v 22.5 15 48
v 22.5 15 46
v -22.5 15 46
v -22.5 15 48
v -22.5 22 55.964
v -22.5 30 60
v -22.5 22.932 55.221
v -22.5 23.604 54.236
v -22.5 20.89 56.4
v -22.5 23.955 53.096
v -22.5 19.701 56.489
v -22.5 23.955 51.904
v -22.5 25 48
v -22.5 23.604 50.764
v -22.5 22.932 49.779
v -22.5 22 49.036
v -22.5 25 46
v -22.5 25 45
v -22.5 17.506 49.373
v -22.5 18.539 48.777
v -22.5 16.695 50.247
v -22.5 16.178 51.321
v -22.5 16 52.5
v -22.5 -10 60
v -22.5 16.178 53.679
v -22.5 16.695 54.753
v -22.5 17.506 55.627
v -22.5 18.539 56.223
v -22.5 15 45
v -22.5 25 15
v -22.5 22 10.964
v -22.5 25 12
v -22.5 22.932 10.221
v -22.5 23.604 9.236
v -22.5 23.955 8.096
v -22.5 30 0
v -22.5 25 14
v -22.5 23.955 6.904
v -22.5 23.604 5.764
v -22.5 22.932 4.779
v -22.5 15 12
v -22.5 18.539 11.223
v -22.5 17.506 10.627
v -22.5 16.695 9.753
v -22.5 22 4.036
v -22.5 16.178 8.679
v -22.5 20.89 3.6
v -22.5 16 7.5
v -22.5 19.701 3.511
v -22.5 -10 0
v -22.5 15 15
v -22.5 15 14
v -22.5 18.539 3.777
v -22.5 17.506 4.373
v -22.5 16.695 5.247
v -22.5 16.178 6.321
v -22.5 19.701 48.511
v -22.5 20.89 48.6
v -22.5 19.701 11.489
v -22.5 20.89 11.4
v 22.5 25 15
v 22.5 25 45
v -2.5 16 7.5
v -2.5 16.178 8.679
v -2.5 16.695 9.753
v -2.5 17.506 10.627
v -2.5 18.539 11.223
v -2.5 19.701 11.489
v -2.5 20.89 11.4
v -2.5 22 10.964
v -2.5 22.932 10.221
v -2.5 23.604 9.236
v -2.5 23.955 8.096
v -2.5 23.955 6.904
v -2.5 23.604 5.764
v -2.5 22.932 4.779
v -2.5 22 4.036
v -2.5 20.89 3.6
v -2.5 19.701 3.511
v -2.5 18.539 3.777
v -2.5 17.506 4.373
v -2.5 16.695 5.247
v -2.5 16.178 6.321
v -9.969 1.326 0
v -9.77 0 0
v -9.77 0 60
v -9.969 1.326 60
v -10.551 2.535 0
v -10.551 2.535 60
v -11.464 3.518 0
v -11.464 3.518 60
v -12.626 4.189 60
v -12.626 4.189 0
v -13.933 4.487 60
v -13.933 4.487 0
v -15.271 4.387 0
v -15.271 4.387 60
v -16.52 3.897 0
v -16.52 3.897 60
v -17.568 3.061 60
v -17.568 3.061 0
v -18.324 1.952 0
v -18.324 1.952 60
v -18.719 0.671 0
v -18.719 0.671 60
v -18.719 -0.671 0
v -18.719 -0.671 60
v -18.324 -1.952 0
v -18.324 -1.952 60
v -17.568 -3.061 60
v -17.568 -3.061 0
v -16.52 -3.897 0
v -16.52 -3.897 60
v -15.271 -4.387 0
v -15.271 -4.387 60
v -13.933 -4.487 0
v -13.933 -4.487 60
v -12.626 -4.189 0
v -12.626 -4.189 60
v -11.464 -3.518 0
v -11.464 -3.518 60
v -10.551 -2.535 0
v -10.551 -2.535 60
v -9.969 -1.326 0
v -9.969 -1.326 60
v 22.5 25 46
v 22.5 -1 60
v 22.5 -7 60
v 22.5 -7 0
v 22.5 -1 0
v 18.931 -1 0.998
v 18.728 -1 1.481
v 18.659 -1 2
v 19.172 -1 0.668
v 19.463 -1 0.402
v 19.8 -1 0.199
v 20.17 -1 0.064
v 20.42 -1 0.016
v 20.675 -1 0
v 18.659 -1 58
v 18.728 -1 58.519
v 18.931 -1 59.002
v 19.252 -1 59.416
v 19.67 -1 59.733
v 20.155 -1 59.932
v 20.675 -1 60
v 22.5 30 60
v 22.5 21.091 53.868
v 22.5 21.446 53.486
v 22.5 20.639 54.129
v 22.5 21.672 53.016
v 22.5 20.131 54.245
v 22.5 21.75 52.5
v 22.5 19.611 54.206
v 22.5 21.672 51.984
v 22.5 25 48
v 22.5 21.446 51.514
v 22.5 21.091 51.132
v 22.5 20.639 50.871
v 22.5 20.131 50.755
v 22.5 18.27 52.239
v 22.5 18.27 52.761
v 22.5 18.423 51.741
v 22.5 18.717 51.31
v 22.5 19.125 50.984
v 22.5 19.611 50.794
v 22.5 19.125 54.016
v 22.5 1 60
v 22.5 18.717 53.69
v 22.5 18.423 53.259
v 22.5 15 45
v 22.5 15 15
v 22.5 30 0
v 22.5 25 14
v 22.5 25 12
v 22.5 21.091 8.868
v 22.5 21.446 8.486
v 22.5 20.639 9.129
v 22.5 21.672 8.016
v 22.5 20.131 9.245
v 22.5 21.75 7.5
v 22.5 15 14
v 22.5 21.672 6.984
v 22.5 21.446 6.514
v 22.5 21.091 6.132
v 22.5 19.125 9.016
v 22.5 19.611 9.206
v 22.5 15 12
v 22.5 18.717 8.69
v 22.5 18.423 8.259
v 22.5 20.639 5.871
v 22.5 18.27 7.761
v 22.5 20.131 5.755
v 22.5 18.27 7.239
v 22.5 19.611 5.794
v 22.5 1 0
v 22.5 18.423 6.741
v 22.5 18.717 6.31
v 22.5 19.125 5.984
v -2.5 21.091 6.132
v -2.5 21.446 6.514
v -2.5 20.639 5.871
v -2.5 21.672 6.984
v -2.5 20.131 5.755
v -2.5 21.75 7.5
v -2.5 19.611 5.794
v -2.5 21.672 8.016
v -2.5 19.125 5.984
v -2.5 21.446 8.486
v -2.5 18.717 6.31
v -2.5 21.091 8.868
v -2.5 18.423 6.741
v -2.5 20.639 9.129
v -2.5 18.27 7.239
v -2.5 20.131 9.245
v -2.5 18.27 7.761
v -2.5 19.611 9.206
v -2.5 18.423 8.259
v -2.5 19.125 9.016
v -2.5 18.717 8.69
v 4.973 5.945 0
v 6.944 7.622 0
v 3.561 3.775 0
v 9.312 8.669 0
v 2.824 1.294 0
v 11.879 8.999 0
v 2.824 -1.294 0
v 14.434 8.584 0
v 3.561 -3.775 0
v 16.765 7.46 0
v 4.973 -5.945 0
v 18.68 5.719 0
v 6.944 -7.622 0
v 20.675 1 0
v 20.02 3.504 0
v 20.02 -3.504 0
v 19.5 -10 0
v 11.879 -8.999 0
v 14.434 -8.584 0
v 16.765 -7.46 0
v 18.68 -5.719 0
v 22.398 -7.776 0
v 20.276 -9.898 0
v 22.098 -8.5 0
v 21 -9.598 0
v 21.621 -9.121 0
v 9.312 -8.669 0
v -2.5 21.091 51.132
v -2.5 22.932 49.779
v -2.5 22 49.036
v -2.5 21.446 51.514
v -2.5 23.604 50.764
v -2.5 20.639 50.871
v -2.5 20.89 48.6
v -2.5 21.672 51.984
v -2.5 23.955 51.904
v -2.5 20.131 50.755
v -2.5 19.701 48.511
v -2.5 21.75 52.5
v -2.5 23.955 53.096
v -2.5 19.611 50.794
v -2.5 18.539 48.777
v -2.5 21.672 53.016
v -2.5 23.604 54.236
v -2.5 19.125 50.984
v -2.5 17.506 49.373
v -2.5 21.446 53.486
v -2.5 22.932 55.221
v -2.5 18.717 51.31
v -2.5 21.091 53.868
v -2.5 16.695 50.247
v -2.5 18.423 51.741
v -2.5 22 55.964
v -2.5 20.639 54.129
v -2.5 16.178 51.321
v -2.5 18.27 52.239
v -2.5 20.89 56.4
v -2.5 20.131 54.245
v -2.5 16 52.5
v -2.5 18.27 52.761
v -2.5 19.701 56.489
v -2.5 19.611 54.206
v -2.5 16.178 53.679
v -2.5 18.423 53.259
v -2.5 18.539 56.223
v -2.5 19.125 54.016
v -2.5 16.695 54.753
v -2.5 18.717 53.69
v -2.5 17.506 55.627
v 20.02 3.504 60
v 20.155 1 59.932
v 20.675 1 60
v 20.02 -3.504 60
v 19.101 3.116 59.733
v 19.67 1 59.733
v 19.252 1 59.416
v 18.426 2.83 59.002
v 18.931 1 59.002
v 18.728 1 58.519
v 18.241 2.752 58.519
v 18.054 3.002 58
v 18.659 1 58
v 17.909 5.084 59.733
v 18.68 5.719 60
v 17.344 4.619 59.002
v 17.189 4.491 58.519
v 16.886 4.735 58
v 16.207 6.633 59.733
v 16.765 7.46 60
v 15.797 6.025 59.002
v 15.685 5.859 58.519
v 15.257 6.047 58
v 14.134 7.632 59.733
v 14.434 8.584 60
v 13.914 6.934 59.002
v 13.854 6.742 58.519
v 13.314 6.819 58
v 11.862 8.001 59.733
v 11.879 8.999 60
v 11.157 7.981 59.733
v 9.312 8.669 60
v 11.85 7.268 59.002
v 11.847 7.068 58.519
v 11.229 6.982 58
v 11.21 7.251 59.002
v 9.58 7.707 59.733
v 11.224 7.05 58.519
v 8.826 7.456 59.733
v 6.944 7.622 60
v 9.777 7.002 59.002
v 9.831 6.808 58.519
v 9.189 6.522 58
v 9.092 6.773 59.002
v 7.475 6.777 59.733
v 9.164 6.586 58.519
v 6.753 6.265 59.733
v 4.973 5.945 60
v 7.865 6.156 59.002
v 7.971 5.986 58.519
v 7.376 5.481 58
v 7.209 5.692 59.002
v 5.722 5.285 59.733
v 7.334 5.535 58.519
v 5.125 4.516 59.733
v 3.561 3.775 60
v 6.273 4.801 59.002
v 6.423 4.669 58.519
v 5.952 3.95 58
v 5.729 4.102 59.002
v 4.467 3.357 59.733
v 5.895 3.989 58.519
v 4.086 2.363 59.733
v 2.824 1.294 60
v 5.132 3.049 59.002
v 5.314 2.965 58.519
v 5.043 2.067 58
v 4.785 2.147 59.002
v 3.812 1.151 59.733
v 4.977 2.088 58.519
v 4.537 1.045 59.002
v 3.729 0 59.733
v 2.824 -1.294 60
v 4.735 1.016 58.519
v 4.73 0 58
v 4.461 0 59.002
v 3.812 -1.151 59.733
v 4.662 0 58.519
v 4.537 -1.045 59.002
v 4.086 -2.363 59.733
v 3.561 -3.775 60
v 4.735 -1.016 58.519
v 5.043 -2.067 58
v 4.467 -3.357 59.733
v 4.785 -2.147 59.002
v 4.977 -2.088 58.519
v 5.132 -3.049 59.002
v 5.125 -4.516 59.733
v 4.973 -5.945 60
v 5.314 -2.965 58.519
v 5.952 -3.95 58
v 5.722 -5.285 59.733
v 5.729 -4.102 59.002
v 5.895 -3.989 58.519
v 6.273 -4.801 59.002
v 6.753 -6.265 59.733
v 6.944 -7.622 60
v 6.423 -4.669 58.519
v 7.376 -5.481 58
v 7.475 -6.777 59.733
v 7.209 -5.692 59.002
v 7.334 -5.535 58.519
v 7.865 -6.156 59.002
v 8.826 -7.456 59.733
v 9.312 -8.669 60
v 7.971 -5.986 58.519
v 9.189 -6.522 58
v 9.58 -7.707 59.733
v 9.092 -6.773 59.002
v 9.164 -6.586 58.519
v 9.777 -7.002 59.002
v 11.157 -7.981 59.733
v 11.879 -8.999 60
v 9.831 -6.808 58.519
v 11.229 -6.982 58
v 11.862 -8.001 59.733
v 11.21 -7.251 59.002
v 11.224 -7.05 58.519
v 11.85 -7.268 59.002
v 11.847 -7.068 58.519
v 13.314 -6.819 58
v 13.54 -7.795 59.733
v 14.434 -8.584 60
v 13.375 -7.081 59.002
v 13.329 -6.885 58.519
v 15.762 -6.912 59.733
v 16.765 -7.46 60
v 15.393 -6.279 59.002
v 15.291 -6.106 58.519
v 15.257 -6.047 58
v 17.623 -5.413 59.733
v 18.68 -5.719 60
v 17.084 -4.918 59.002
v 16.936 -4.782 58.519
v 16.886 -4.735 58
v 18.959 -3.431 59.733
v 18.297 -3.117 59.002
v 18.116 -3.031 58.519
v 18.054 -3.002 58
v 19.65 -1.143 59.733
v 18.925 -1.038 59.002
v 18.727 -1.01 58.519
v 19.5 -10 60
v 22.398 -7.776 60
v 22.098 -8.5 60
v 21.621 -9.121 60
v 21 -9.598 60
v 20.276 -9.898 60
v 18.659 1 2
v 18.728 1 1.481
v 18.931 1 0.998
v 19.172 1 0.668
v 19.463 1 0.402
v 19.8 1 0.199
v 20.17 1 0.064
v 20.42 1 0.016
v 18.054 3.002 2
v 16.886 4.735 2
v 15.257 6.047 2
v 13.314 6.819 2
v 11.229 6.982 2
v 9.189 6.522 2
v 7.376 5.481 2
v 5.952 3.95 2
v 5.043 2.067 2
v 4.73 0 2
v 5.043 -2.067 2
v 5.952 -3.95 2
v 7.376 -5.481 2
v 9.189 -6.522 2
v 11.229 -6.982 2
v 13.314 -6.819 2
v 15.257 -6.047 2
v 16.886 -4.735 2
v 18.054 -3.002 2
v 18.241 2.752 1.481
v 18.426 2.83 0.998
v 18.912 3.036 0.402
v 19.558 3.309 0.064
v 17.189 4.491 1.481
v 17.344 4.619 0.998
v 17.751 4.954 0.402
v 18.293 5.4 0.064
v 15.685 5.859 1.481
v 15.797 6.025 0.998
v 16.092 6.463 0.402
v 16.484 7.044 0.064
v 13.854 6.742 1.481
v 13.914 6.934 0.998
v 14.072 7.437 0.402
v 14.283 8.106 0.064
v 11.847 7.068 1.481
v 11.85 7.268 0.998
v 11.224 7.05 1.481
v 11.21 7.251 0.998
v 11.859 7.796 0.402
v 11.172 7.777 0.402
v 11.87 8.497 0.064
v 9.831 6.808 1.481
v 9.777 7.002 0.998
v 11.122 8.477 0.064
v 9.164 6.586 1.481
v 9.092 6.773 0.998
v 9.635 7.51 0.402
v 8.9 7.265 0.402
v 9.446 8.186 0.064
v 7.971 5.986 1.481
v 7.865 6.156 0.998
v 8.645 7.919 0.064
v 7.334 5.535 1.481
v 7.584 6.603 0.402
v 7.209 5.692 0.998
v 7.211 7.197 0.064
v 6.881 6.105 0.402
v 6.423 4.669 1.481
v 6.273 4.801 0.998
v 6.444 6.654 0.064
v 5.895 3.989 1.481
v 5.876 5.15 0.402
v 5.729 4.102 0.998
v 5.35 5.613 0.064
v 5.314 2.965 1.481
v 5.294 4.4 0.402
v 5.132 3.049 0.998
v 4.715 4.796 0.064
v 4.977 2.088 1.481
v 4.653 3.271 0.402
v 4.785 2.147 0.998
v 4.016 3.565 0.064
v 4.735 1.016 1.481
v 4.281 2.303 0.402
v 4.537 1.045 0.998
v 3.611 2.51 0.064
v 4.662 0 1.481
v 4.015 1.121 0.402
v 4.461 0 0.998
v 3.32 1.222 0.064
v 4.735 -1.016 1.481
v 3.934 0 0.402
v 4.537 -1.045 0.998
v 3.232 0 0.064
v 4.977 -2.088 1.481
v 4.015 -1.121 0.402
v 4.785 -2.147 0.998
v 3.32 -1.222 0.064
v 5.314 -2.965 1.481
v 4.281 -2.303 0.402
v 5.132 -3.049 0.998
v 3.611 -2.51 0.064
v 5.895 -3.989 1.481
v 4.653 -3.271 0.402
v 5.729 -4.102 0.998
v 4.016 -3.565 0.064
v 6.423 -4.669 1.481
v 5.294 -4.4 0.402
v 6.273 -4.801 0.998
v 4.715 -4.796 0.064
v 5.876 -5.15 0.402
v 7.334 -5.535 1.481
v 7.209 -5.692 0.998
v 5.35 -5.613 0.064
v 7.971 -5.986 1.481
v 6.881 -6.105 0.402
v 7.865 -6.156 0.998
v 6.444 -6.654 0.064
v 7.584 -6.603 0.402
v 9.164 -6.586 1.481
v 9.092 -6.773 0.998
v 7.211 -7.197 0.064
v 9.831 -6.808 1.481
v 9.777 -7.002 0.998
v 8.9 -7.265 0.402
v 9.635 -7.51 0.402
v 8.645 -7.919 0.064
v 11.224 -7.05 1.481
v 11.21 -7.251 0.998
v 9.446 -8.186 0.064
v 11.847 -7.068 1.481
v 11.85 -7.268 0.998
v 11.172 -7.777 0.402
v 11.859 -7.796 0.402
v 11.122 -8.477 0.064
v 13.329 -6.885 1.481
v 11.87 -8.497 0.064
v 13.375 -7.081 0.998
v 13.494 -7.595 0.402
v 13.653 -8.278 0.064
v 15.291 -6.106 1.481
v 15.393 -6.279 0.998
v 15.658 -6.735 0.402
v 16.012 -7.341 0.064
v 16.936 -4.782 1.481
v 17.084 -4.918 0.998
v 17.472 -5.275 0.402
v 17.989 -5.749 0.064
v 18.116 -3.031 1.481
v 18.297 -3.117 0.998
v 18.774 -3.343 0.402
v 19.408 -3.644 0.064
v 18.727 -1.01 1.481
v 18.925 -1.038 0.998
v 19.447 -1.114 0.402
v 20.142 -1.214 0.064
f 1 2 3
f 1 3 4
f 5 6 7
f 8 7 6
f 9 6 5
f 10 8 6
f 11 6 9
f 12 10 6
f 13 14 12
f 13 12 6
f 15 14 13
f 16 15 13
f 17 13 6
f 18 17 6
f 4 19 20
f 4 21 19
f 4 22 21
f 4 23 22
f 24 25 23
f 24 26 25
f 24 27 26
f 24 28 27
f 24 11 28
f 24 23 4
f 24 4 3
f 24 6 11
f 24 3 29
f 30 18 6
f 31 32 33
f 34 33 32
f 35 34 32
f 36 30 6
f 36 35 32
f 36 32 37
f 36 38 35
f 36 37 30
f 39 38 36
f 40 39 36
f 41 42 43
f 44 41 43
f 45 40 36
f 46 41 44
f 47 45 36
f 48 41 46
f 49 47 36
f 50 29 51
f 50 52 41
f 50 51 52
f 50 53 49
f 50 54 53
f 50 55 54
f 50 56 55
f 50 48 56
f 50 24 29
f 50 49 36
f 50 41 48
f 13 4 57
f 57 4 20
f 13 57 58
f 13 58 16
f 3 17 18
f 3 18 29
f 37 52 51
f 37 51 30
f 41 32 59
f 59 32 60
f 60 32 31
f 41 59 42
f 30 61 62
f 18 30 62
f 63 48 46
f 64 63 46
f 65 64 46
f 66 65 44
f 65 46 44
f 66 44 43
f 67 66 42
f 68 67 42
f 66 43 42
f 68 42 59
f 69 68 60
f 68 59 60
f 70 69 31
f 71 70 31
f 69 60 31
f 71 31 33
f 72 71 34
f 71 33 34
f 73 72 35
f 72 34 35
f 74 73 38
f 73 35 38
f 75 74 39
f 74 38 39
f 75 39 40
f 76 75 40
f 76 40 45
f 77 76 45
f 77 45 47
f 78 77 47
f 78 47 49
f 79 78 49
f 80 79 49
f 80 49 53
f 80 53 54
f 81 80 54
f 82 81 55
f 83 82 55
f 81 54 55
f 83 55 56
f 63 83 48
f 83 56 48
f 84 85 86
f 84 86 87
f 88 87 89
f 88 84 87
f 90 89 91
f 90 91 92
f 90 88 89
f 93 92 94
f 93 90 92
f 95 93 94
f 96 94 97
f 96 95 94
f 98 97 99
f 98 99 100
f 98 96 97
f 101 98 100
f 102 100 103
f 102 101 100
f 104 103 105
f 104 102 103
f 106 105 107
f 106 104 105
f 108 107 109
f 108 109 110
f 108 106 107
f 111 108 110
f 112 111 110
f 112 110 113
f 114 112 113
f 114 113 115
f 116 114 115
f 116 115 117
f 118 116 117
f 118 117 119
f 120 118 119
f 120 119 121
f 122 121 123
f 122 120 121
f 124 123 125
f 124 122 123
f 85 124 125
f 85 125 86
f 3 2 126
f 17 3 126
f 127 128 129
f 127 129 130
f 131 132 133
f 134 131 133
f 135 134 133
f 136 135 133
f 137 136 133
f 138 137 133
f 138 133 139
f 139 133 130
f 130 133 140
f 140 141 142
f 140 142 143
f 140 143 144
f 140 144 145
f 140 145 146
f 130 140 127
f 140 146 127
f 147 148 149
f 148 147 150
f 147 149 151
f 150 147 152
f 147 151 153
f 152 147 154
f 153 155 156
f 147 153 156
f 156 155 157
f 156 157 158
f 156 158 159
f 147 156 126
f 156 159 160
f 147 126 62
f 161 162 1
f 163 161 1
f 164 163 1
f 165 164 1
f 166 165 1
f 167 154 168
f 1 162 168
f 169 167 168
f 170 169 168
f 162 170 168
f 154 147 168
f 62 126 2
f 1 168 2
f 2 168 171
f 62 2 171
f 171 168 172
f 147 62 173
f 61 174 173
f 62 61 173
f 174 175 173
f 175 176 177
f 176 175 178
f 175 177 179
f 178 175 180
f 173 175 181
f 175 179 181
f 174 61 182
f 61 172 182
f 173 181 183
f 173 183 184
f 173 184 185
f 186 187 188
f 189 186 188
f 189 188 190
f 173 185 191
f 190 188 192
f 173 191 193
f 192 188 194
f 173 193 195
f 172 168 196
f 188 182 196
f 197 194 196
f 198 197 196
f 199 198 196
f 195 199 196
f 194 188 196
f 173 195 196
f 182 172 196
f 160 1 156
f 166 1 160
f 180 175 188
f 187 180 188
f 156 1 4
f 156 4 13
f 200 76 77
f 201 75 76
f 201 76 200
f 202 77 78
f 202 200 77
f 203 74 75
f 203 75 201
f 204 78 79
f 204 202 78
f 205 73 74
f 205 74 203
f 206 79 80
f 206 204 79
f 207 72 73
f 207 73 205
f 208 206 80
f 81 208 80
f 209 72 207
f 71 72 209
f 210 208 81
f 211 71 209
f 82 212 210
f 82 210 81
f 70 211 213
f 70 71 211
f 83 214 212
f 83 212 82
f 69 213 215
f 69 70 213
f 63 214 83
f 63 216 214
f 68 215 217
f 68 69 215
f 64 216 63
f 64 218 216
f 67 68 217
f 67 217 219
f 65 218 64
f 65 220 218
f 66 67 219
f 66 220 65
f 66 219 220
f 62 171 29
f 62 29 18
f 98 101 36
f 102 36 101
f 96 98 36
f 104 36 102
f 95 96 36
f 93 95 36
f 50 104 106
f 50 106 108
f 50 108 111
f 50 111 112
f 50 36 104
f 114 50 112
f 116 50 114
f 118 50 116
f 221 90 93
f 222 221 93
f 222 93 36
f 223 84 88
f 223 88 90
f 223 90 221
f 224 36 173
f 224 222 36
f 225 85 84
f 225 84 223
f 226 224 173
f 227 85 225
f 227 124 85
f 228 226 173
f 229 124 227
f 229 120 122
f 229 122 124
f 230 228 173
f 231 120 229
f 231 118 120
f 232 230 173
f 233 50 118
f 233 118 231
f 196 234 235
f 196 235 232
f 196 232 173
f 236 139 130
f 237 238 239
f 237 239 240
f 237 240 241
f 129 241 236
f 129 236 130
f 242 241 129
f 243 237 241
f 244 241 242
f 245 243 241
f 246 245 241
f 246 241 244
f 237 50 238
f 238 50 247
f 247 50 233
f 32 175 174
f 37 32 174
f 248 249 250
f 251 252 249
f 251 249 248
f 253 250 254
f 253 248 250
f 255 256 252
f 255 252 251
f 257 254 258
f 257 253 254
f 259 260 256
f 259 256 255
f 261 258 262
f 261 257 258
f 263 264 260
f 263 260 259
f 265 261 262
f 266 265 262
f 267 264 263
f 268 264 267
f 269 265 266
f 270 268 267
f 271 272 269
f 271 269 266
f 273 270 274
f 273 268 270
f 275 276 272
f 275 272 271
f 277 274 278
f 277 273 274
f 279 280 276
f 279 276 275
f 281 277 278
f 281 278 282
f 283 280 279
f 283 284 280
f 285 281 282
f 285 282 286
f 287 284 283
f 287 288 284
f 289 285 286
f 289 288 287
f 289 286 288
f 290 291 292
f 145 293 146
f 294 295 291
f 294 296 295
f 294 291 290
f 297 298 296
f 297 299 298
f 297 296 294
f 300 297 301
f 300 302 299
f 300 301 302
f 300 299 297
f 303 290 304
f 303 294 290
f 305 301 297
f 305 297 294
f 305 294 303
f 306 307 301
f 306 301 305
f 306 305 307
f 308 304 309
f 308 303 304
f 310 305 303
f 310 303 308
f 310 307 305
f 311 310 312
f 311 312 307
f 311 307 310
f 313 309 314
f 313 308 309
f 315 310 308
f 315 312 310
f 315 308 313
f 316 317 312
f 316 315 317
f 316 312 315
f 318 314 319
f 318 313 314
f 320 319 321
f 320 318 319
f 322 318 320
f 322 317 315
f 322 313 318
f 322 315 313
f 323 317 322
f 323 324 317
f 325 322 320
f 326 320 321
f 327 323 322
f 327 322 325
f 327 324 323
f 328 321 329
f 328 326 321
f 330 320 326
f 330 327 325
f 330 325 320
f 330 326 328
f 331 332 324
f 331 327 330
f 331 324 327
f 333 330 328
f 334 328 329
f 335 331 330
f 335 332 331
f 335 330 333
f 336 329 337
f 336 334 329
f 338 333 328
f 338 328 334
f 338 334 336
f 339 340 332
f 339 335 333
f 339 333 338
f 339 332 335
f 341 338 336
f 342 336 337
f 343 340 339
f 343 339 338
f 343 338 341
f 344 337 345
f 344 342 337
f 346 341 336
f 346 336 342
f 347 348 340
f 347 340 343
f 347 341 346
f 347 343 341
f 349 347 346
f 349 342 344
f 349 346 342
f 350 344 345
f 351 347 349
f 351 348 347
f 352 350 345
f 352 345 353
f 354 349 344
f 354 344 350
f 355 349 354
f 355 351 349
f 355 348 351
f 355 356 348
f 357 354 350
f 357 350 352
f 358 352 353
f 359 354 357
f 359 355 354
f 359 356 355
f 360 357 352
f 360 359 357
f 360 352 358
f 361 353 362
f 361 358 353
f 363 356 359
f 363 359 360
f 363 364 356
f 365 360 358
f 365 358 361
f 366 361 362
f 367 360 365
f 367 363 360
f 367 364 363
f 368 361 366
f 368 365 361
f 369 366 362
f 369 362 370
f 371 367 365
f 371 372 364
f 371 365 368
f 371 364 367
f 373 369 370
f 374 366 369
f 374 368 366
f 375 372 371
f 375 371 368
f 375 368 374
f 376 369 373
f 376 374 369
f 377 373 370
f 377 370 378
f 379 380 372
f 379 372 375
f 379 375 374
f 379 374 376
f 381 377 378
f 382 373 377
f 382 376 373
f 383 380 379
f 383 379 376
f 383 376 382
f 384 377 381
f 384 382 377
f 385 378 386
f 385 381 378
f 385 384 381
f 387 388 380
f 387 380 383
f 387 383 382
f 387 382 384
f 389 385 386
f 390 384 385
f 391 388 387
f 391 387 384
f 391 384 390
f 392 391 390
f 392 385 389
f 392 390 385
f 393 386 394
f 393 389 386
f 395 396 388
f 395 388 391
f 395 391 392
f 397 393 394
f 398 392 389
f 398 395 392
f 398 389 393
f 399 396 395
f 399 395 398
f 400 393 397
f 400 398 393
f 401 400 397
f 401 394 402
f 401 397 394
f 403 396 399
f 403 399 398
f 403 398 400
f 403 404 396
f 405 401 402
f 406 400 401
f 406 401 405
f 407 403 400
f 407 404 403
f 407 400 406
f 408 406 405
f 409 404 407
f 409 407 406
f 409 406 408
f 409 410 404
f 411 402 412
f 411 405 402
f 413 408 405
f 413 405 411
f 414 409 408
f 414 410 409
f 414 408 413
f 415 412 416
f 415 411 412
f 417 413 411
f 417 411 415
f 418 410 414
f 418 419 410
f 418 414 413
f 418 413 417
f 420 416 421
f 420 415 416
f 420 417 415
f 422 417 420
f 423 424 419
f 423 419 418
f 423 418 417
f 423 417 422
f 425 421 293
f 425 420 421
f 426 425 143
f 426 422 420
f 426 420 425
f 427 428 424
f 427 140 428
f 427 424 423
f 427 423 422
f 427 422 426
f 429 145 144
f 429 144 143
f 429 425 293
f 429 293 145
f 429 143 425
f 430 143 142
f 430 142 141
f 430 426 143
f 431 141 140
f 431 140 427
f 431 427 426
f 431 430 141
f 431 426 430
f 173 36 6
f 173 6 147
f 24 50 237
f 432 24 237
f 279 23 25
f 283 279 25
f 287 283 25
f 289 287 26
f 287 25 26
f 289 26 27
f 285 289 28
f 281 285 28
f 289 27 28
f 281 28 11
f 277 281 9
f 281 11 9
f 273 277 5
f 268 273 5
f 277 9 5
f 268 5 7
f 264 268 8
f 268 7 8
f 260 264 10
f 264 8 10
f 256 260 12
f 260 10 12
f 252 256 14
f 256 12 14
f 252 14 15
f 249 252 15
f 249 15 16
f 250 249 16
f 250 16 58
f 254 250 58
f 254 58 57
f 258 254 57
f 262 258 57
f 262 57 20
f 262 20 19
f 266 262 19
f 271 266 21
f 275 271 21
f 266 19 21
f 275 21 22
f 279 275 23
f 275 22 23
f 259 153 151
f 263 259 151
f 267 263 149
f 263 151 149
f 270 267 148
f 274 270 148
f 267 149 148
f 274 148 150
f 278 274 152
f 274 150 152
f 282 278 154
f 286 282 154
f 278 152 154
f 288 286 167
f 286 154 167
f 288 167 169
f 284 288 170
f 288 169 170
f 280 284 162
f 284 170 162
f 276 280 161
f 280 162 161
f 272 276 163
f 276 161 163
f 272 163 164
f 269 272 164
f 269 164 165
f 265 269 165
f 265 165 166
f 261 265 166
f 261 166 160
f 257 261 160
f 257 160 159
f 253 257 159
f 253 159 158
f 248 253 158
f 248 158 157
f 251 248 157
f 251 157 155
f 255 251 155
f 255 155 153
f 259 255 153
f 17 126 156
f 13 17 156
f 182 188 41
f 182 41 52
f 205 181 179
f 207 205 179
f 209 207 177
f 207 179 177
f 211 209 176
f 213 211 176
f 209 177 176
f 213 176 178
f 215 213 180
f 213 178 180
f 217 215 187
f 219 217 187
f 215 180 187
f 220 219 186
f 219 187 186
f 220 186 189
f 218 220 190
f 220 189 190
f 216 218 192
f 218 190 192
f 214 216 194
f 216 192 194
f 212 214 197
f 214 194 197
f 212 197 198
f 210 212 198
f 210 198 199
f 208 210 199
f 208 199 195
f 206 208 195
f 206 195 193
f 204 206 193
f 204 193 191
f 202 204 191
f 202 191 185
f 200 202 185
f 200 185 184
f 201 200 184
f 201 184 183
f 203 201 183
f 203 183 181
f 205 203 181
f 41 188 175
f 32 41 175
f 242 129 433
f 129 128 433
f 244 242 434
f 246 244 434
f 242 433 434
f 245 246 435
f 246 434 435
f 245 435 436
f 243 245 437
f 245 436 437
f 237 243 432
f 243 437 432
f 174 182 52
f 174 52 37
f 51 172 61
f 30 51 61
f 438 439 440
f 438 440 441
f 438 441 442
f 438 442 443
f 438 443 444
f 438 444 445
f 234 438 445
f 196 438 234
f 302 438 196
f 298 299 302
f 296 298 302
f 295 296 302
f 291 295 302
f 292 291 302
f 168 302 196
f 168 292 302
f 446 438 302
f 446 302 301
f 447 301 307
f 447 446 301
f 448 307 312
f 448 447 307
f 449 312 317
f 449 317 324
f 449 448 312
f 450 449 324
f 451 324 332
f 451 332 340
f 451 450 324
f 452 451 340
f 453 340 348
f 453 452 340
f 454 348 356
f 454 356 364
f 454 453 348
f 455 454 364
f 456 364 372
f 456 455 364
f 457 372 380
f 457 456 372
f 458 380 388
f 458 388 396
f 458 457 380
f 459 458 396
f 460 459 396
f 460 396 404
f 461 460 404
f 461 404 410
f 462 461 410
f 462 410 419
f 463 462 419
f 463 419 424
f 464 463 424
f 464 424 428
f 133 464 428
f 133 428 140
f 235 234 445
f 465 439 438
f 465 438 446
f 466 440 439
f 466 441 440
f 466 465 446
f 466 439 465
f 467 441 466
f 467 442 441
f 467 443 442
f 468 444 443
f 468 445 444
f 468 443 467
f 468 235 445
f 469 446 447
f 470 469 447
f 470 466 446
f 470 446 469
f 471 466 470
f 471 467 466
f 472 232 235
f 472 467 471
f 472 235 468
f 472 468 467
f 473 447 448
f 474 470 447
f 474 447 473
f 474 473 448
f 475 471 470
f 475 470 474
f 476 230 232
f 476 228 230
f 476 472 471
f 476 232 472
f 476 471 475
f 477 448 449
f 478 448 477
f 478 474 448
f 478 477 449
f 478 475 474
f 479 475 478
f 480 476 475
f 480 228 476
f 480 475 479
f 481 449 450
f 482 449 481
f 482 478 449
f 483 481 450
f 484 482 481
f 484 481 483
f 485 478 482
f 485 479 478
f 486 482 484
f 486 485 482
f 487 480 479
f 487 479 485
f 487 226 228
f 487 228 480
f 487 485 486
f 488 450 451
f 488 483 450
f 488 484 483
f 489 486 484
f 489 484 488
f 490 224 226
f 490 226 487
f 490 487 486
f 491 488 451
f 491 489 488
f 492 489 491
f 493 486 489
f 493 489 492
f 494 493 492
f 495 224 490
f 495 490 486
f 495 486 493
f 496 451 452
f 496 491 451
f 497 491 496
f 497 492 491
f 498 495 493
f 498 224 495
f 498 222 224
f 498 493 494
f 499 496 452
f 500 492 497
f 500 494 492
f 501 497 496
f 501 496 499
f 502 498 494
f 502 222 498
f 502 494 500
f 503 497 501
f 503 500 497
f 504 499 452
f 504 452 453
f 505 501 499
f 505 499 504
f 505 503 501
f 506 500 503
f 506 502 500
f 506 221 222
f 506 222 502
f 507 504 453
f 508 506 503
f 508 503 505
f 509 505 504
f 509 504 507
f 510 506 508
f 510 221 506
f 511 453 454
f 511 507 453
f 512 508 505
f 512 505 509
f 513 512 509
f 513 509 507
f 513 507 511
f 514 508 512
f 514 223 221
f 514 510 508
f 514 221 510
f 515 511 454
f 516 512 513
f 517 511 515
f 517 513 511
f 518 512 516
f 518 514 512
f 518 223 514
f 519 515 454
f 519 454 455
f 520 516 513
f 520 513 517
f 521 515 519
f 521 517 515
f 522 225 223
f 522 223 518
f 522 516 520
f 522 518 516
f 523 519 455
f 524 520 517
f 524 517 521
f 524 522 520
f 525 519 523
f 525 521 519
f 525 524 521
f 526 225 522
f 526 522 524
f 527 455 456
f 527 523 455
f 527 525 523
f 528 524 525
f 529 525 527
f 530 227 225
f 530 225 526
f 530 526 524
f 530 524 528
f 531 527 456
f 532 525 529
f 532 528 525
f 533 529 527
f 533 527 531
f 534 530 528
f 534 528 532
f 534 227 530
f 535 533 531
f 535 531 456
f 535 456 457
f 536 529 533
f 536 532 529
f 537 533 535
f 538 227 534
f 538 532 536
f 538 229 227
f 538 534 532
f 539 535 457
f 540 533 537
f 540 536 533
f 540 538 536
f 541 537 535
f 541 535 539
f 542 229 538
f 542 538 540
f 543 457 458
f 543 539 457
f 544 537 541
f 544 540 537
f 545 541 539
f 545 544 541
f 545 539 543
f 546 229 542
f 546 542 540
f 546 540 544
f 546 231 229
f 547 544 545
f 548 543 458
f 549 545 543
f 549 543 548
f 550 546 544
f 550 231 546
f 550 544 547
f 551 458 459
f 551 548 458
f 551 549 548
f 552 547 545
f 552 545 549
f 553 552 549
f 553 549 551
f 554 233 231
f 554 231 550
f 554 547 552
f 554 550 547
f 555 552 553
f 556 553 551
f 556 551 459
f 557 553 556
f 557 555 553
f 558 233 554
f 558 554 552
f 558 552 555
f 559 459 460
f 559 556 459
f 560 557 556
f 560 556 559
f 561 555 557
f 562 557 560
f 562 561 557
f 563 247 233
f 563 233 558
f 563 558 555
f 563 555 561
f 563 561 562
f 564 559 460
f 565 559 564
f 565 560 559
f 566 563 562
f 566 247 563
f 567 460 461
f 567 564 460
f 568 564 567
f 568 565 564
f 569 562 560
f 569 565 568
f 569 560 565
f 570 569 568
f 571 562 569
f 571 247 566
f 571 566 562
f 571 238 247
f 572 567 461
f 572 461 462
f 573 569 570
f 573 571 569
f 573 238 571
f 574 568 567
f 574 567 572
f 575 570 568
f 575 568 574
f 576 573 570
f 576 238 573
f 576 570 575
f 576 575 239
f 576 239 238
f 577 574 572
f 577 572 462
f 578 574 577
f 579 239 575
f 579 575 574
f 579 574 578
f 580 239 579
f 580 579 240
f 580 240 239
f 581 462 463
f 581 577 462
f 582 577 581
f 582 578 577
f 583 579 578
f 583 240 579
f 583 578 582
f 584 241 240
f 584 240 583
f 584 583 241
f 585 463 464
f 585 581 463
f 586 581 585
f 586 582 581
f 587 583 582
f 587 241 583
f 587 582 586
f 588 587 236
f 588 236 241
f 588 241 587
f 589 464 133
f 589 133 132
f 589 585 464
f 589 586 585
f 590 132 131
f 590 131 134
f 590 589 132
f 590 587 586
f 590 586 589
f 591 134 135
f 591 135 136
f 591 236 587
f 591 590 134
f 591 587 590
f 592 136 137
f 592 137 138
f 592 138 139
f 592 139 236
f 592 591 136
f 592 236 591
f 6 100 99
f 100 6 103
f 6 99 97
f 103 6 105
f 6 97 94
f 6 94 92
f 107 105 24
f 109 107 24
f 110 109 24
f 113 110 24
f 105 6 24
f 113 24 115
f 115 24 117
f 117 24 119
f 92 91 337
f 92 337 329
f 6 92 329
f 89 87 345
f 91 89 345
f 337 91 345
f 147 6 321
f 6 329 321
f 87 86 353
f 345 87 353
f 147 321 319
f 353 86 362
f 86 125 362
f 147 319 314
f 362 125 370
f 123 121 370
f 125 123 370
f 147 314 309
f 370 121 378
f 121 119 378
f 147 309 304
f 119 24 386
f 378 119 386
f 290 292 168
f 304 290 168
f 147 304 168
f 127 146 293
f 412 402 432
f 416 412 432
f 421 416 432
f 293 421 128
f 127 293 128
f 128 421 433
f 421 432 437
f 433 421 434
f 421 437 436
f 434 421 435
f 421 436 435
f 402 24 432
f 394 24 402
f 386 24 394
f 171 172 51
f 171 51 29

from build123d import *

# Parameters (mm, degrees)
SKETCH051_W       = 45
SKETCH051_H       = 20
SKETCH051_R       = 4.5
SKETCH051_R_2     = 7
PAD029_DEPTH      = 60
SKETCH052_W       = 4
SKETCH052_H       = 2
POCKET025_DEPTH   = 60.001
POCKET025_FACE1_W = 45
POCKET025_FACE1_H = 60
PAD030_DEPTH      = 20
FILLET001_R       = 3
FILLET002_R       = 2
FILLET003_R       = 2
SKETCH054_R       = 4
POCKET026_DEPTH   = 20
SKETCH053_R       = 1.75
SKETCH053_W       = 10
SKETCH053_H       = 30
SKETCH053_H_2     = 2
POCKET027_DEPTH   = 45.001


with BuildPart() as part:
    # Sketch051 → Pad029 (new body)
    with BuildSketch(Plane.XY):
        Rectangle(SKETCH051_W, SKETCH051_H)
        with Locations((-14.26955, 0)):
            Circle(SKETCH051_R, mode=Mode.SUBTRACT)
        with Locations((11.73045, 0)):
            Circle(SKETCH051_R_2, mode=Mode.SUBTRACT)
    extrude(amount=PAD029_DEPTH)

    # Sketch052 (on Face8 of Pad029) → Pocket025 (cut, through all)
    with BuildSketch(Plane.XY.offset(60)):
        with Locations((20.51, 0)):
            Rectangle(SKETCH052_W, SKETCH052_H)
    extrude(amount=-POCKET025_DEPTH, mode=Mode.SUBTRACT)

    # Pocket025 Face1 → Pad030 (add)
    with BuildSketch(Plane(origin=(0, 10, 30), x_dir=(1, 0, 0), z_dir=(0, 1, 0))):
        Rectangle(POCKET025_FACE1_W, POCKET025_FACE1_H)
    extrude(amount=PAD030_DEPTH)

    # Fillet001
    fillet001_edges = [part.edges().sort_by_distance(p)[0] for p in [
        (22.5, -10, 30),
    ]]
    fillet(fillet001_edges, radius=FILLET001_R)

    # Fillet002
    fillet002_edges = [part.edges().sort_by_distance(p)[0] for p in [
        (4.73045, 0, 60),
    ]]
    fillet(fillet002_edges, radius=FILLET002_R)

    # Fillet003
    fillet003_edges = [part.edges().sort_by_distance(p)[0] for p in [
        (4.73045, 0, 0),
    ]]
    fillet(fillet003_edges, radius=FILLET003_R)

    # Sketch054 (on Face3 of Pad030) → Pocket026 (cut)
    with BuildSketch(Plane(origin=(-22.5, 0, 0), x_dir=(0, -1, 0), z_dir=(-1, 0, 0))):
        with Locations((-20, 52.5)):
            Circle(SKETCH054_R)
        with Locations((-20, 7.5)):
            Circle(SKETCH054_R)
    extrude(amount=-POCKET026_DEPTH, mode=Mode.SUBTRACT)

    # Sketch053 (on Face15 of Pad030) → Pocket027 (cut, through all)
    with BuildSketch(Plane.YZ.offset(22.5)):
        with Locations((20, 52.5)):
            Circle(SKETCH053_R)
        with Locations((20, 7.5)):
            Circle(SKETCH053_R)
        with Locations((20, 30)):
            Rectangle(SKETCH053_W, SKETCH053_H)
        with Locations((20, 47)):
            Rectangle(SKETCH053_W, SKETCH053_H_2)
        with Locations((20, 13)):
            Rectangle(SKETCH053_W, SKETCH053_H_2)
    extrude(amount=-POCKET027_DEPTH, mode=Mode.SUBTRACT)


solid = part.part
